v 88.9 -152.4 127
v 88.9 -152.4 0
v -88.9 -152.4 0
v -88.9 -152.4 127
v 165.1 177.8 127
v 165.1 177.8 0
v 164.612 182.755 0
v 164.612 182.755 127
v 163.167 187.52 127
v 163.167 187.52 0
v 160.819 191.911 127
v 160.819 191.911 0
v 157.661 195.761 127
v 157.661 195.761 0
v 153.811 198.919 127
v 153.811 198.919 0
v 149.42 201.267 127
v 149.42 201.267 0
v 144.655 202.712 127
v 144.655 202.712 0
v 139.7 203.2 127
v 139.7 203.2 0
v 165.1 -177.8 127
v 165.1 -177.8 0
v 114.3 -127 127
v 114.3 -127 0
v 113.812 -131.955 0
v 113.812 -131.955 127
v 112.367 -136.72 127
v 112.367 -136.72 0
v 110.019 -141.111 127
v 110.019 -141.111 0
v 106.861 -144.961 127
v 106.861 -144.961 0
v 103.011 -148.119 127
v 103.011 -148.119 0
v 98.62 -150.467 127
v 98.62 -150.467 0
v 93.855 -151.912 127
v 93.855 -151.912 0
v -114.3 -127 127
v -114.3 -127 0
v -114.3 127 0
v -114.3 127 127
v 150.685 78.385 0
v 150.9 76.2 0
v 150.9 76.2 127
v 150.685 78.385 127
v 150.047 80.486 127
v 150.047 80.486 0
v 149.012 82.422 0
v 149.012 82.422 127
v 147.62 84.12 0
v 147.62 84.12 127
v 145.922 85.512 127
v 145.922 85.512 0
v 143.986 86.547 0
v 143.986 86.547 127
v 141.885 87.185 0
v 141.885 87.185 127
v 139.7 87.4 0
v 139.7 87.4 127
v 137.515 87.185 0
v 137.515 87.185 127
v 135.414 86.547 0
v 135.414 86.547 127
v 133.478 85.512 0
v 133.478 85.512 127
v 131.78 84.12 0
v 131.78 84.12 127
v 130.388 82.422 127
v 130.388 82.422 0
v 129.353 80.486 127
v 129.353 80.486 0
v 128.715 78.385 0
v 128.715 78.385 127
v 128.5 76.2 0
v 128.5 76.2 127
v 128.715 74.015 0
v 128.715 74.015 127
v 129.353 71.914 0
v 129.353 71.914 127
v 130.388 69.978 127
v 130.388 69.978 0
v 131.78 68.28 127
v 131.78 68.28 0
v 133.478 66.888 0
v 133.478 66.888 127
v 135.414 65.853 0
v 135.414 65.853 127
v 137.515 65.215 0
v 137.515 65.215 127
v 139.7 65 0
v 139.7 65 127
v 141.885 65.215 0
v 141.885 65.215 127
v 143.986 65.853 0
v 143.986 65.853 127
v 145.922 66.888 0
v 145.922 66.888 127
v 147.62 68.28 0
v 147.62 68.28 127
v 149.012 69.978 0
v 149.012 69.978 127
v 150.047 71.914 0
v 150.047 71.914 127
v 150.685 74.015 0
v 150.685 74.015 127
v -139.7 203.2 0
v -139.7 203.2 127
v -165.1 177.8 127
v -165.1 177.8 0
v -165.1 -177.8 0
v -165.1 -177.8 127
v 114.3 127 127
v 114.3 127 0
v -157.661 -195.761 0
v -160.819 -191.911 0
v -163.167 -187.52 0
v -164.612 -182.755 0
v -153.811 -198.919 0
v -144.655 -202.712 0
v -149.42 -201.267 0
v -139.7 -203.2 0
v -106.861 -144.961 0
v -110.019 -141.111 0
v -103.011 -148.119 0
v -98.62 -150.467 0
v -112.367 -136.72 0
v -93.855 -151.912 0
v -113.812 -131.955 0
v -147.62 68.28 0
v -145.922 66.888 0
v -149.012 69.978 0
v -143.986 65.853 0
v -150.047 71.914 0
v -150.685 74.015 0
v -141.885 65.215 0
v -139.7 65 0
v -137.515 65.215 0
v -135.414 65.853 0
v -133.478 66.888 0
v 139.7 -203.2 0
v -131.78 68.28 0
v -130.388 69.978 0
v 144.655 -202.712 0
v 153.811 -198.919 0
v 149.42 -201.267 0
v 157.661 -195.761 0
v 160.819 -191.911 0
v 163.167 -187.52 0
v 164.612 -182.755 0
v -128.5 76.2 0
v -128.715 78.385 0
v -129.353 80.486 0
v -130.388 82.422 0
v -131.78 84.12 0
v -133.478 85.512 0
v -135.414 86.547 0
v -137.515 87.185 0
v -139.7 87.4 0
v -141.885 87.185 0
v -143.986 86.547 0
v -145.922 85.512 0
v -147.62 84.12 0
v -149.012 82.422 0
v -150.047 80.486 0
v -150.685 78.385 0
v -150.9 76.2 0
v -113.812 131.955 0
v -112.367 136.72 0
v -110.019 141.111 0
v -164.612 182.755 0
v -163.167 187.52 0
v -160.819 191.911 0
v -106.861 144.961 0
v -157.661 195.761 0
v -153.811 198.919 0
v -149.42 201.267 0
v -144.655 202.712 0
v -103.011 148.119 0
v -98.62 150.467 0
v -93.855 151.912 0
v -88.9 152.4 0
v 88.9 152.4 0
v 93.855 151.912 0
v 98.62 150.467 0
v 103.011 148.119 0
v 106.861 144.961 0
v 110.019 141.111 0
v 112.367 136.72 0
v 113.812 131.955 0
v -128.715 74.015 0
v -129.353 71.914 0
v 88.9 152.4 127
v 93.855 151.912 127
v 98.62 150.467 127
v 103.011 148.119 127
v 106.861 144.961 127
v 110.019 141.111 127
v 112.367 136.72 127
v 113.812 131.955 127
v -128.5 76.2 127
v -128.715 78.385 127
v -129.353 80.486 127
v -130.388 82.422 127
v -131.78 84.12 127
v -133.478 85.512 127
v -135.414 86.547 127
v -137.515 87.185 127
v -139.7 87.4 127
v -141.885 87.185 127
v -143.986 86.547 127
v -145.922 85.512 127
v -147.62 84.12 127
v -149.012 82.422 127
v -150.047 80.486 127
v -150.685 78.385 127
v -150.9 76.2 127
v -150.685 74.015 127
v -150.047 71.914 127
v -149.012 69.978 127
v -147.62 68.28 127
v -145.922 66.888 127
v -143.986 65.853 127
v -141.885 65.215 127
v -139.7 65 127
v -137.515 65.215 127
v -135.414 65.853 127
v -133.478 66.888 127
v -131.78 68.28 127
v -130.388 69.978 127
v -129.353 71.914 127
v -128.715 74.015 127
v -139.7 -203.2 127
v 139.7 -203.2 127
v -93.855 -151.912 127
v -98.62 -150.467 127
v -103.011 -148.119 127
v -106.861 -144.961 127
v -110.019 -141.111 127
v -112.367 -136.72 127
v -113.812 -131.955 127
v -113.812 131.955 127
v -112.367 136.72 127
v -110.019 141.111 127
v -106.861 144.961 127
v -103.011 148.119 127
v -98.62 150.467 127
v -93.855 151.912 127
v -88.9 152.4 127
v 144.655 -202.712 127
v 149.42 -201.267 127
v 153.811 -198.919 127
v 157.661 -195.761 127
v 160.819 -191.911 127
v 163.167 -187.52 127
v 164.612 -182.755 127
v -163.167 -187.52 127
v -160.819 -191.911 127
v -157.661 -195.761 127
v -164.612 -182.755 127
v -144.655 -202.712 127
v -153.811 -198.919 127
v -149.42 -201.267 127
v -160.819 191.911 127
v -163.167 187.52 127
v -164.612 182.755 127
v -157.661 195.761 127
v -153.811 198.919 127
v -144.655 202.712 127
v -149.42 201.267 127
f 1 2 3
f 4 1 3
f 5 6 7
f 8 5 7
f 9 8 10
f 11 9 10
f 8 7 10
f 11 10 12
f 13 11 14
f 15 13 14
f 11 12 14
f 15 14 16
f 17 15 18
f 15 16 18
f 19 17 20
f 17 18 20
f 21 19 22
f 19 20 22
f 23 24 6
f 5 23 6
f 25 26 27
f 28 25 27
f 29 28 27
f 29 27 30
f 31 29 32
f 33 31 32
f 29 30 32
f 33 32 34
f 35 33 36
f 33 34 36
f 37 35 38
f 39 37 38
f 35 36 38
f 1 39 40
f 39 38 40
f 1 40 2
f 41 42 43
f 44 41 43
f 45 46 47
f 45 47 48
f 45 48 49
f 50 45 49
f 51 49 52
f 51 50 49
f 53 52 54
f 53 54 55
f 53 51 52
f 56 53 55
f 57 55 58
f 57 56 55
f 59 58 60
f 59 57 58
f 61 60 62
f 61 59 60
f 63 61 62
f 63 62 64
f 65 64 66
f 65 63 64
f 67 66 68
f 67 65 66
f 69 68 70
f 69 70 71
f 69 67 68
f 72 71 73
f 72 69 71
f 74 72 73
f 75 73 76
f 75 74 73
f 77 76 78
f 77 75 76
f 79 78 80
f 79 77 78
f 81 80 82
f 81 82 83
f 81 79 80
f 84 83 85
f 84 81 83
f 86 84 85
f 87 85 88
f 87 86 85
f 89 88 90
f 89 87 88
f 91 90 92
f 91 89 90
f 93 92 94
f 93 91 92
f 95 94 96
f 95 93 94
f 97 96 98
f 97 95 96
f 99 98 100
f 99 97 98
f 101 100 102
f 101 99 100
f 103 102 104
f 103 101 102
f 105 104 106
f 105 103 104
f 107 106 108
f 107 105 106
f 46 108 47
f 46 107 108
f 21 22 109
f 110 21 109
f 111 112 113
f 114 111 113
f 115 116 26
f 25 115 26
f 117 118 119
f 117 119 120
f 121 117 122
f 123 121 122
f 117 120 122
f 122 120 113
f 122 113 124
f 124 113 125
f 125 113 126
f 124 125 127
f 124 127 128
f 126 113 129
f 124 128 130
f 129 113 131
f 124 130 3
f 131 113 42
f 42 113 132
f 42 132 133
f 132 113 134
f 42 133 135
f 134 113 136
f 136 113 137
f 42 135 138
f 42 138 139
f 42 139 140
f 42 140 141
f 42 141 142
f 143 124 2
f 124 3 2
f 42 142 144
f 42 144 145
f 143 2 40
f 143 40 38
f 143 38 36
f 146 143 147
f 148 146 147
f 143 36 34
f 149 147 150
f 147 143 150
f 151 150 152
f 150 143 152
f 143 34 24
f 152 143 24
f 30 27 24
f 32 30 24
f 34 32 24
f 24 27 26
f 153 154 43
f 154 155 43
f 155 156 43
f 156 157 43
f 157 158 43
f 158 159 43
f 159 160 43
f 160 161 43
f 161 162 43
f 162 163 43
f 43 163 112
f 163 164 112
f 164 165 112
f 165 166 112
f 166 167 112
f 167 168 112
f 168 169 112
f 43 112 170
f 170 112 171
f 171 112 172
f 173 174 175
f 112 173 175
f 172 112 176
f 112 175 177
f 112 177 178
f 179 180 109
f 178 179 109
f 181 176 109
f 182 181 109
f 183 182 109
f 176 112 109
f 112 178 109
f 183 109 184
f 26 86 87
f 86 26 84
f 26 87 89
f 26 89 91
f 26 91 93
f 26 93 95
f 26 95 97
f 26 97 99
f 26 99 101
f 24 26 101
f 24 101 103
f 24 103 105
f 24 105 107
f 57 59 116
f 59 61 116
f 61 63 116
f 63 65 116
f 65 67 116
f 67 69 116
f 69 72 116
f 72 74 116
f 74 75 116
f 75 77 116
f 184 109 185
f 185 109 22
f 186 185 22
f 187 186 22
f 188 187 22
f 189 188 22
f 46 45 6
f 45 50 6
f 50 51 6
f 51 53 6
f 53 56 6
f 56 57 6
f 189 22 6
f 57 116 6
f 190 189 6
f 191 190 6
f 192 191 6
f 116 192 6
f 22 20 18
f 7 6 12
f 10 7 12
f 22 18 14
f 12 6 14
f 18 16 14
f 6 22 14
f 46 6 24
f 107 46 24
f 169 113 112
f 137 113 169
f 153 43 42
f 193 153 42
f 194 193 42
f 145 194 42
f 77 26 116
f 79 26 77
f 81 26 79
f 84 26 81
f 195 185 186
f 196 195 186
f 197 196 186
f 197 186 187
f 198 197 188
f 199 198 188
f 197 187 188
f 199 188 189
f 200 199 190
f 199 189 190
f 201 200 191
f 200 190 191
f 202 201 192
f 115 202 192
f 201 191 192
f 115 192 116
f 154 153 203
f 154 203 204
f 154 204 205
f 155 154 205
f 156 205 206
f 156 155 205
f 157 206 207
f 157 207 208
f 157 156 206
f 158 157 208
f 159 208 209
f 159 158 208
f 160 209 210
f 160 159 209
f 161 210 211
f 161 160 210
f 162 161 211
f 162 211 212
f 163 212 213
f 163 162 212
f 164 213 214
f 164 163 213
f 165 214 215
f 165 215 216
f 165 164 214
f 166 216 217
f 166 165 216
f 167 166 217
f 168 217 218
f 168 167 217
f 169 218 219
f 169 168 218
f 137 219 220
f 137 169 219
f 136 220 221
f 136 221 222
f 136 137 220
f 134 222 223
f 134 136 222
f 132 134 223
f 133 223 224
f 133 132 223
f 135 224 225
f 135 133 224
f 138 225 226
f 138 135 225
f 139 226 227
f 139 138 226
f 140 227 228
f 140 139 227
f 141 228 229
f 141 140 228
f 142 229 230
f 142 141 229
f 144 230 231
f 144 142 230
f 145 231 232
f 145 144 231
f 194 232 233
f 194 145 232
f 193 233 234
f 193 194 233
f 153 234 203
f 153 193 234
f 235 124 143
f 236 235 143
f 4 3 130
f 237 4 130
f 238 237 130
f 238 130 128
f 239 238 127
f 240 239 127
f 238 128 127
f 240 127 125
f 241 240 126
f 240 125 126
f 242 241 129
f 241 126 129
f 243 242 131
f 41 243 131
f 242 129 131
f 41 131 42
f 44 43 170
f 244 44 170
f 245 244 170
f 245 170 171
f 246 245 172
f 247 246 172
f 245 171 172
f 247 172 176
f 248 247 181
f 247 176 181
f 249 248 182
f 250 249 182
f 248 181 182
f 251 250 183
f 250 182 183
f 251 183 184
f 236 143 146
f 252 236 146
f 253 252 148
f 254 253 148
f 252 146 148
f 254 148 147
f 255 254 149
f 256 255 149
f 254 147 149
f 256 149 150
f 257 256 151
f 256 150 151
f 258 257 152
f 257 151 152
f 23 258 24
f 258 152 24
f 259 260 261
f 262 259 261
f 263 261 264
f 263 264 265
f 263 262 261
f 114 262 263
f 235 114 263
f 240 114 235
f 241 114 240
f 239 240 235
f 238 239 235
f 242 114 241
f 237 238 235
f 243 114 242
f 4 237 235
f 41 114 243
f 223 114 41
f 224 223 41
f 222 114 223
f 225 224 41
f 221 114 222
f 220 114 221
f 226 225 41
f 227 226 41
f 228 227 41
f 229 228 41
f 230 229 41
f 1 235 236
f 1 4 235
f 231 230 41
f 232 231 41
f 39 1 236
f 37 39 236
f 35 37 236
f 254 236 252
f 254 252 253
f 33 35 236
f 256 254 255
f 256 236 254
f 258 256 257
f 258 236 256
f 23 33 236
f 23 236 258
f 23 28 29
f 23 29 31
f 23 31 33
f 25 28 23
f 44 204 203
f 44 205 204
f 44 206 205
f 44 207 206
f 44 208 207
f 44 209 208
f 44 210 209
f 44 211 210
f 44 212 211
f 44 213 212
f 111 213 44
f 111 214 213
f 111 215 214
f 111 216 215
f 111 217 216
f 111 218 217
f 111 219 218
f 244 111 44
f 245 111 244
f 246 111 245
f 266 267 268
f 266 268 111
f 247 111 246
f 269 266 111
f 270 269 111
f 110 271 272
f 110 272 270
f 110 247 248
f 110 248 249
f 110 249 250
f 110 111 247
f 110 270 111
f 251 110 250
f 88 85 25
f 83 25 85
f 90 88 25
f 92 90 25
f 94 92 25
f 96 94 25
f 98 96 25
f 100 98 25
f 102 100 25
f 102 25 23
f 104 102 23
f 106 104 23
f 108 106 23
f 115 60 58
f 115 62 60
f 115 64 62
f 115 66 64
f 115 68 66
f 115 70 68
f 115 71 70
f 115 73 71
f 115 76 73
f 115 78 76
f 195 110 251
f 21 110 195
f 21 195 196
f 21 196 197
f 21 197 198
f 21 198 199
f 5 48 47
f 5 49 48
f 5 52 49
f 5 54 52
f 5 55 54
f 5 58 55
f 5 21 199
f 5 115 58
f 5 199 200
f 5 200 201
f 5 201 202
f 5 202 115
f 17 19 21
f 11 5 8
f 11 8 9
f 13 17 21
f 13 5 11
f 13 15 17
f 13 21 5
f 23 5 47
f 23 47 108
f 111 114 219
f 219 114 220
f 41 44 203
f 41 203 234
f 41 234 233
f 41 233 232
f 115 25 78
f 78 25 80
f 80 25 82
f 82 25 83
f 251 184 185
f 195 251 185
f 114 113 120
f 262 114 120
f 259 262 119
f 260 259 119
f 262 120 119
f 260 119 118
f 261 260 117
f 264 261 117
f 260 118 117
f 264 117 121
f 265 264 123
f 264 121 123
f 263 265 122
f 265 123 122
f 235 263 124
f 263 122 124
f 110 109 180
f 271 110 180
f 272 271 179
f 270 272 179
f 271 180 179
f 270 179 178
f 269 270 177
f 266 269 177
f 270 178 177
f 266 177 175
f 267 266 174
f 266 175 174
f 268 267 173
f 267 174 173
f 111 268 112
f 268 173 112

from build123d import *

# Parameters (mm, degrees)
SKETCH1_R           = 11.2
BOSS_EXTRUDE1_DEPTH = 127


with BuildPart() as part:
    # Sketch1 → Boss-Extrude1 (new body)
    with BuildSketch(Plane.XY):
        with BuildLine():
            Line((-139.7, -203.2), (139.7, -203.2))
            ThreePointArc((139.7, -203.2), (157.660512242, -195.760512242), (165.1, -177.8))
            Line((165.1, -177.8), (165.1, 177.8))
            ThreePointArc((165.1, 177.8), (157.660512242, 195.760512242), (139.7, 203.2))
            Line((139.7, 203.2), (-139.7, 203.2))
            ThreePointArc((-139.7, 203.2), (-157.660512242, 195.760512242), (-165.1, 177.8))
            Line((-165.1, 177.8), (-165.1, -177.8))
            ThreePointArc((-165.1, -177.8), (-157.660512242, -195.760512242), (-139.7, -203.2))
        make_face()
        with Locations((-139.7, 76.2)):
            Circle(SKETCH1_R, mode=Mode.SUBTRACT)
        with Locations((139.7, 76.2)):
            Circle(SKETCH1_R, mode=Mode.SUBTRACT)
        with BuildLine():
            Line((-114.3, -127), (-114.3, 127))
            ThreePointArc((-114.3, 127), (-106.860512242, 144.960512242), (-88.9, 152.4))
            Line((-88.9, 152.4), (88.9, 152.4))
            ThreePointArc((88.9, 152.4), (106.860512242, 144.960512242), (114.3, 127))
            Line((114.3, 127), (114.3, -127))
            ThreePointArc((114.3, -127), (106.860512242, -144.960512242), (88.9, -152.4))
            Line((88.9, -152.4), (-88.9, -152.4))
            ThreePointArc((-88.9, -152.4), (-106.860512242, -144.960512242), (-114.3, -127))
        make_face(mode=Mode.SUBTRACT)
    extrude(amount=BOSS_EXTRUDE1_DEPTH)


solid = part.part
